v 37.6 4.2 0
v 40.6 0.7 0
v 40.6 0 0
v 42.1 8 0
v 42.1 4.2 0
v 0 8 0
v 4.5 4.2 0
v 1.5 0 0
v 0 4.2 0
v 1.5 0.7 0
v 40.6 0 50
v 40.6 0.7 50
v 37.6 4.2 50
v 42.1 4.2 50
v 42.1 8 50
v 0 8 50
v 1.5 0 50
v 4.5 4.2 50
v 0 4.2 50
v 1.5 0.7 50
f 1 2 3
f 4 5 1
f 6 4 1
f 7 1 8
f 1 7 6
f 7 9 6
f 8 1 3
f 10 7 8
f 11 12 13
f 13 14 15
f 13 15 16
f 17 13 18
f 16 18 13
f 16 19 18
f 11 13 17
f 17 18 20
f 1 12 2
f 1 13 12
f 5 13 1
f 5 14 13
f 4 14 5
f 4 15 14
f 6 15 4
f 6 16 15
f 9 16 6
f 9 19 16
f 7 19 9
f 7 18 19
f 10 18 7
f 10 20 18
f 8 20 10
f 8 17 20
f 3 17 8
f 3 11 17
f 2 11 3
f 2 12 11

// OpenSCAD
// created by IndiePandaaaaa | Lukas

function as_width() = 42.1;

function as_height() = 8;

module arca_swiss(depth = 50) {
  linear_extrude(depth) {
    polygon([
        [1.5, 0],
        [as_width() - 1.5, 0],
        [as_width() - 1.5, 0.7],
        [as_width() - 4.5, 4.2],
        [as_width(), 4.2],
        [as_width(), as_height()],
        [0, as_height()],
        [0, 4.2],
        [4.5, 4.2],
        [1.5, 0.7],
      ]);
  }
}

arca_swiss(50);
